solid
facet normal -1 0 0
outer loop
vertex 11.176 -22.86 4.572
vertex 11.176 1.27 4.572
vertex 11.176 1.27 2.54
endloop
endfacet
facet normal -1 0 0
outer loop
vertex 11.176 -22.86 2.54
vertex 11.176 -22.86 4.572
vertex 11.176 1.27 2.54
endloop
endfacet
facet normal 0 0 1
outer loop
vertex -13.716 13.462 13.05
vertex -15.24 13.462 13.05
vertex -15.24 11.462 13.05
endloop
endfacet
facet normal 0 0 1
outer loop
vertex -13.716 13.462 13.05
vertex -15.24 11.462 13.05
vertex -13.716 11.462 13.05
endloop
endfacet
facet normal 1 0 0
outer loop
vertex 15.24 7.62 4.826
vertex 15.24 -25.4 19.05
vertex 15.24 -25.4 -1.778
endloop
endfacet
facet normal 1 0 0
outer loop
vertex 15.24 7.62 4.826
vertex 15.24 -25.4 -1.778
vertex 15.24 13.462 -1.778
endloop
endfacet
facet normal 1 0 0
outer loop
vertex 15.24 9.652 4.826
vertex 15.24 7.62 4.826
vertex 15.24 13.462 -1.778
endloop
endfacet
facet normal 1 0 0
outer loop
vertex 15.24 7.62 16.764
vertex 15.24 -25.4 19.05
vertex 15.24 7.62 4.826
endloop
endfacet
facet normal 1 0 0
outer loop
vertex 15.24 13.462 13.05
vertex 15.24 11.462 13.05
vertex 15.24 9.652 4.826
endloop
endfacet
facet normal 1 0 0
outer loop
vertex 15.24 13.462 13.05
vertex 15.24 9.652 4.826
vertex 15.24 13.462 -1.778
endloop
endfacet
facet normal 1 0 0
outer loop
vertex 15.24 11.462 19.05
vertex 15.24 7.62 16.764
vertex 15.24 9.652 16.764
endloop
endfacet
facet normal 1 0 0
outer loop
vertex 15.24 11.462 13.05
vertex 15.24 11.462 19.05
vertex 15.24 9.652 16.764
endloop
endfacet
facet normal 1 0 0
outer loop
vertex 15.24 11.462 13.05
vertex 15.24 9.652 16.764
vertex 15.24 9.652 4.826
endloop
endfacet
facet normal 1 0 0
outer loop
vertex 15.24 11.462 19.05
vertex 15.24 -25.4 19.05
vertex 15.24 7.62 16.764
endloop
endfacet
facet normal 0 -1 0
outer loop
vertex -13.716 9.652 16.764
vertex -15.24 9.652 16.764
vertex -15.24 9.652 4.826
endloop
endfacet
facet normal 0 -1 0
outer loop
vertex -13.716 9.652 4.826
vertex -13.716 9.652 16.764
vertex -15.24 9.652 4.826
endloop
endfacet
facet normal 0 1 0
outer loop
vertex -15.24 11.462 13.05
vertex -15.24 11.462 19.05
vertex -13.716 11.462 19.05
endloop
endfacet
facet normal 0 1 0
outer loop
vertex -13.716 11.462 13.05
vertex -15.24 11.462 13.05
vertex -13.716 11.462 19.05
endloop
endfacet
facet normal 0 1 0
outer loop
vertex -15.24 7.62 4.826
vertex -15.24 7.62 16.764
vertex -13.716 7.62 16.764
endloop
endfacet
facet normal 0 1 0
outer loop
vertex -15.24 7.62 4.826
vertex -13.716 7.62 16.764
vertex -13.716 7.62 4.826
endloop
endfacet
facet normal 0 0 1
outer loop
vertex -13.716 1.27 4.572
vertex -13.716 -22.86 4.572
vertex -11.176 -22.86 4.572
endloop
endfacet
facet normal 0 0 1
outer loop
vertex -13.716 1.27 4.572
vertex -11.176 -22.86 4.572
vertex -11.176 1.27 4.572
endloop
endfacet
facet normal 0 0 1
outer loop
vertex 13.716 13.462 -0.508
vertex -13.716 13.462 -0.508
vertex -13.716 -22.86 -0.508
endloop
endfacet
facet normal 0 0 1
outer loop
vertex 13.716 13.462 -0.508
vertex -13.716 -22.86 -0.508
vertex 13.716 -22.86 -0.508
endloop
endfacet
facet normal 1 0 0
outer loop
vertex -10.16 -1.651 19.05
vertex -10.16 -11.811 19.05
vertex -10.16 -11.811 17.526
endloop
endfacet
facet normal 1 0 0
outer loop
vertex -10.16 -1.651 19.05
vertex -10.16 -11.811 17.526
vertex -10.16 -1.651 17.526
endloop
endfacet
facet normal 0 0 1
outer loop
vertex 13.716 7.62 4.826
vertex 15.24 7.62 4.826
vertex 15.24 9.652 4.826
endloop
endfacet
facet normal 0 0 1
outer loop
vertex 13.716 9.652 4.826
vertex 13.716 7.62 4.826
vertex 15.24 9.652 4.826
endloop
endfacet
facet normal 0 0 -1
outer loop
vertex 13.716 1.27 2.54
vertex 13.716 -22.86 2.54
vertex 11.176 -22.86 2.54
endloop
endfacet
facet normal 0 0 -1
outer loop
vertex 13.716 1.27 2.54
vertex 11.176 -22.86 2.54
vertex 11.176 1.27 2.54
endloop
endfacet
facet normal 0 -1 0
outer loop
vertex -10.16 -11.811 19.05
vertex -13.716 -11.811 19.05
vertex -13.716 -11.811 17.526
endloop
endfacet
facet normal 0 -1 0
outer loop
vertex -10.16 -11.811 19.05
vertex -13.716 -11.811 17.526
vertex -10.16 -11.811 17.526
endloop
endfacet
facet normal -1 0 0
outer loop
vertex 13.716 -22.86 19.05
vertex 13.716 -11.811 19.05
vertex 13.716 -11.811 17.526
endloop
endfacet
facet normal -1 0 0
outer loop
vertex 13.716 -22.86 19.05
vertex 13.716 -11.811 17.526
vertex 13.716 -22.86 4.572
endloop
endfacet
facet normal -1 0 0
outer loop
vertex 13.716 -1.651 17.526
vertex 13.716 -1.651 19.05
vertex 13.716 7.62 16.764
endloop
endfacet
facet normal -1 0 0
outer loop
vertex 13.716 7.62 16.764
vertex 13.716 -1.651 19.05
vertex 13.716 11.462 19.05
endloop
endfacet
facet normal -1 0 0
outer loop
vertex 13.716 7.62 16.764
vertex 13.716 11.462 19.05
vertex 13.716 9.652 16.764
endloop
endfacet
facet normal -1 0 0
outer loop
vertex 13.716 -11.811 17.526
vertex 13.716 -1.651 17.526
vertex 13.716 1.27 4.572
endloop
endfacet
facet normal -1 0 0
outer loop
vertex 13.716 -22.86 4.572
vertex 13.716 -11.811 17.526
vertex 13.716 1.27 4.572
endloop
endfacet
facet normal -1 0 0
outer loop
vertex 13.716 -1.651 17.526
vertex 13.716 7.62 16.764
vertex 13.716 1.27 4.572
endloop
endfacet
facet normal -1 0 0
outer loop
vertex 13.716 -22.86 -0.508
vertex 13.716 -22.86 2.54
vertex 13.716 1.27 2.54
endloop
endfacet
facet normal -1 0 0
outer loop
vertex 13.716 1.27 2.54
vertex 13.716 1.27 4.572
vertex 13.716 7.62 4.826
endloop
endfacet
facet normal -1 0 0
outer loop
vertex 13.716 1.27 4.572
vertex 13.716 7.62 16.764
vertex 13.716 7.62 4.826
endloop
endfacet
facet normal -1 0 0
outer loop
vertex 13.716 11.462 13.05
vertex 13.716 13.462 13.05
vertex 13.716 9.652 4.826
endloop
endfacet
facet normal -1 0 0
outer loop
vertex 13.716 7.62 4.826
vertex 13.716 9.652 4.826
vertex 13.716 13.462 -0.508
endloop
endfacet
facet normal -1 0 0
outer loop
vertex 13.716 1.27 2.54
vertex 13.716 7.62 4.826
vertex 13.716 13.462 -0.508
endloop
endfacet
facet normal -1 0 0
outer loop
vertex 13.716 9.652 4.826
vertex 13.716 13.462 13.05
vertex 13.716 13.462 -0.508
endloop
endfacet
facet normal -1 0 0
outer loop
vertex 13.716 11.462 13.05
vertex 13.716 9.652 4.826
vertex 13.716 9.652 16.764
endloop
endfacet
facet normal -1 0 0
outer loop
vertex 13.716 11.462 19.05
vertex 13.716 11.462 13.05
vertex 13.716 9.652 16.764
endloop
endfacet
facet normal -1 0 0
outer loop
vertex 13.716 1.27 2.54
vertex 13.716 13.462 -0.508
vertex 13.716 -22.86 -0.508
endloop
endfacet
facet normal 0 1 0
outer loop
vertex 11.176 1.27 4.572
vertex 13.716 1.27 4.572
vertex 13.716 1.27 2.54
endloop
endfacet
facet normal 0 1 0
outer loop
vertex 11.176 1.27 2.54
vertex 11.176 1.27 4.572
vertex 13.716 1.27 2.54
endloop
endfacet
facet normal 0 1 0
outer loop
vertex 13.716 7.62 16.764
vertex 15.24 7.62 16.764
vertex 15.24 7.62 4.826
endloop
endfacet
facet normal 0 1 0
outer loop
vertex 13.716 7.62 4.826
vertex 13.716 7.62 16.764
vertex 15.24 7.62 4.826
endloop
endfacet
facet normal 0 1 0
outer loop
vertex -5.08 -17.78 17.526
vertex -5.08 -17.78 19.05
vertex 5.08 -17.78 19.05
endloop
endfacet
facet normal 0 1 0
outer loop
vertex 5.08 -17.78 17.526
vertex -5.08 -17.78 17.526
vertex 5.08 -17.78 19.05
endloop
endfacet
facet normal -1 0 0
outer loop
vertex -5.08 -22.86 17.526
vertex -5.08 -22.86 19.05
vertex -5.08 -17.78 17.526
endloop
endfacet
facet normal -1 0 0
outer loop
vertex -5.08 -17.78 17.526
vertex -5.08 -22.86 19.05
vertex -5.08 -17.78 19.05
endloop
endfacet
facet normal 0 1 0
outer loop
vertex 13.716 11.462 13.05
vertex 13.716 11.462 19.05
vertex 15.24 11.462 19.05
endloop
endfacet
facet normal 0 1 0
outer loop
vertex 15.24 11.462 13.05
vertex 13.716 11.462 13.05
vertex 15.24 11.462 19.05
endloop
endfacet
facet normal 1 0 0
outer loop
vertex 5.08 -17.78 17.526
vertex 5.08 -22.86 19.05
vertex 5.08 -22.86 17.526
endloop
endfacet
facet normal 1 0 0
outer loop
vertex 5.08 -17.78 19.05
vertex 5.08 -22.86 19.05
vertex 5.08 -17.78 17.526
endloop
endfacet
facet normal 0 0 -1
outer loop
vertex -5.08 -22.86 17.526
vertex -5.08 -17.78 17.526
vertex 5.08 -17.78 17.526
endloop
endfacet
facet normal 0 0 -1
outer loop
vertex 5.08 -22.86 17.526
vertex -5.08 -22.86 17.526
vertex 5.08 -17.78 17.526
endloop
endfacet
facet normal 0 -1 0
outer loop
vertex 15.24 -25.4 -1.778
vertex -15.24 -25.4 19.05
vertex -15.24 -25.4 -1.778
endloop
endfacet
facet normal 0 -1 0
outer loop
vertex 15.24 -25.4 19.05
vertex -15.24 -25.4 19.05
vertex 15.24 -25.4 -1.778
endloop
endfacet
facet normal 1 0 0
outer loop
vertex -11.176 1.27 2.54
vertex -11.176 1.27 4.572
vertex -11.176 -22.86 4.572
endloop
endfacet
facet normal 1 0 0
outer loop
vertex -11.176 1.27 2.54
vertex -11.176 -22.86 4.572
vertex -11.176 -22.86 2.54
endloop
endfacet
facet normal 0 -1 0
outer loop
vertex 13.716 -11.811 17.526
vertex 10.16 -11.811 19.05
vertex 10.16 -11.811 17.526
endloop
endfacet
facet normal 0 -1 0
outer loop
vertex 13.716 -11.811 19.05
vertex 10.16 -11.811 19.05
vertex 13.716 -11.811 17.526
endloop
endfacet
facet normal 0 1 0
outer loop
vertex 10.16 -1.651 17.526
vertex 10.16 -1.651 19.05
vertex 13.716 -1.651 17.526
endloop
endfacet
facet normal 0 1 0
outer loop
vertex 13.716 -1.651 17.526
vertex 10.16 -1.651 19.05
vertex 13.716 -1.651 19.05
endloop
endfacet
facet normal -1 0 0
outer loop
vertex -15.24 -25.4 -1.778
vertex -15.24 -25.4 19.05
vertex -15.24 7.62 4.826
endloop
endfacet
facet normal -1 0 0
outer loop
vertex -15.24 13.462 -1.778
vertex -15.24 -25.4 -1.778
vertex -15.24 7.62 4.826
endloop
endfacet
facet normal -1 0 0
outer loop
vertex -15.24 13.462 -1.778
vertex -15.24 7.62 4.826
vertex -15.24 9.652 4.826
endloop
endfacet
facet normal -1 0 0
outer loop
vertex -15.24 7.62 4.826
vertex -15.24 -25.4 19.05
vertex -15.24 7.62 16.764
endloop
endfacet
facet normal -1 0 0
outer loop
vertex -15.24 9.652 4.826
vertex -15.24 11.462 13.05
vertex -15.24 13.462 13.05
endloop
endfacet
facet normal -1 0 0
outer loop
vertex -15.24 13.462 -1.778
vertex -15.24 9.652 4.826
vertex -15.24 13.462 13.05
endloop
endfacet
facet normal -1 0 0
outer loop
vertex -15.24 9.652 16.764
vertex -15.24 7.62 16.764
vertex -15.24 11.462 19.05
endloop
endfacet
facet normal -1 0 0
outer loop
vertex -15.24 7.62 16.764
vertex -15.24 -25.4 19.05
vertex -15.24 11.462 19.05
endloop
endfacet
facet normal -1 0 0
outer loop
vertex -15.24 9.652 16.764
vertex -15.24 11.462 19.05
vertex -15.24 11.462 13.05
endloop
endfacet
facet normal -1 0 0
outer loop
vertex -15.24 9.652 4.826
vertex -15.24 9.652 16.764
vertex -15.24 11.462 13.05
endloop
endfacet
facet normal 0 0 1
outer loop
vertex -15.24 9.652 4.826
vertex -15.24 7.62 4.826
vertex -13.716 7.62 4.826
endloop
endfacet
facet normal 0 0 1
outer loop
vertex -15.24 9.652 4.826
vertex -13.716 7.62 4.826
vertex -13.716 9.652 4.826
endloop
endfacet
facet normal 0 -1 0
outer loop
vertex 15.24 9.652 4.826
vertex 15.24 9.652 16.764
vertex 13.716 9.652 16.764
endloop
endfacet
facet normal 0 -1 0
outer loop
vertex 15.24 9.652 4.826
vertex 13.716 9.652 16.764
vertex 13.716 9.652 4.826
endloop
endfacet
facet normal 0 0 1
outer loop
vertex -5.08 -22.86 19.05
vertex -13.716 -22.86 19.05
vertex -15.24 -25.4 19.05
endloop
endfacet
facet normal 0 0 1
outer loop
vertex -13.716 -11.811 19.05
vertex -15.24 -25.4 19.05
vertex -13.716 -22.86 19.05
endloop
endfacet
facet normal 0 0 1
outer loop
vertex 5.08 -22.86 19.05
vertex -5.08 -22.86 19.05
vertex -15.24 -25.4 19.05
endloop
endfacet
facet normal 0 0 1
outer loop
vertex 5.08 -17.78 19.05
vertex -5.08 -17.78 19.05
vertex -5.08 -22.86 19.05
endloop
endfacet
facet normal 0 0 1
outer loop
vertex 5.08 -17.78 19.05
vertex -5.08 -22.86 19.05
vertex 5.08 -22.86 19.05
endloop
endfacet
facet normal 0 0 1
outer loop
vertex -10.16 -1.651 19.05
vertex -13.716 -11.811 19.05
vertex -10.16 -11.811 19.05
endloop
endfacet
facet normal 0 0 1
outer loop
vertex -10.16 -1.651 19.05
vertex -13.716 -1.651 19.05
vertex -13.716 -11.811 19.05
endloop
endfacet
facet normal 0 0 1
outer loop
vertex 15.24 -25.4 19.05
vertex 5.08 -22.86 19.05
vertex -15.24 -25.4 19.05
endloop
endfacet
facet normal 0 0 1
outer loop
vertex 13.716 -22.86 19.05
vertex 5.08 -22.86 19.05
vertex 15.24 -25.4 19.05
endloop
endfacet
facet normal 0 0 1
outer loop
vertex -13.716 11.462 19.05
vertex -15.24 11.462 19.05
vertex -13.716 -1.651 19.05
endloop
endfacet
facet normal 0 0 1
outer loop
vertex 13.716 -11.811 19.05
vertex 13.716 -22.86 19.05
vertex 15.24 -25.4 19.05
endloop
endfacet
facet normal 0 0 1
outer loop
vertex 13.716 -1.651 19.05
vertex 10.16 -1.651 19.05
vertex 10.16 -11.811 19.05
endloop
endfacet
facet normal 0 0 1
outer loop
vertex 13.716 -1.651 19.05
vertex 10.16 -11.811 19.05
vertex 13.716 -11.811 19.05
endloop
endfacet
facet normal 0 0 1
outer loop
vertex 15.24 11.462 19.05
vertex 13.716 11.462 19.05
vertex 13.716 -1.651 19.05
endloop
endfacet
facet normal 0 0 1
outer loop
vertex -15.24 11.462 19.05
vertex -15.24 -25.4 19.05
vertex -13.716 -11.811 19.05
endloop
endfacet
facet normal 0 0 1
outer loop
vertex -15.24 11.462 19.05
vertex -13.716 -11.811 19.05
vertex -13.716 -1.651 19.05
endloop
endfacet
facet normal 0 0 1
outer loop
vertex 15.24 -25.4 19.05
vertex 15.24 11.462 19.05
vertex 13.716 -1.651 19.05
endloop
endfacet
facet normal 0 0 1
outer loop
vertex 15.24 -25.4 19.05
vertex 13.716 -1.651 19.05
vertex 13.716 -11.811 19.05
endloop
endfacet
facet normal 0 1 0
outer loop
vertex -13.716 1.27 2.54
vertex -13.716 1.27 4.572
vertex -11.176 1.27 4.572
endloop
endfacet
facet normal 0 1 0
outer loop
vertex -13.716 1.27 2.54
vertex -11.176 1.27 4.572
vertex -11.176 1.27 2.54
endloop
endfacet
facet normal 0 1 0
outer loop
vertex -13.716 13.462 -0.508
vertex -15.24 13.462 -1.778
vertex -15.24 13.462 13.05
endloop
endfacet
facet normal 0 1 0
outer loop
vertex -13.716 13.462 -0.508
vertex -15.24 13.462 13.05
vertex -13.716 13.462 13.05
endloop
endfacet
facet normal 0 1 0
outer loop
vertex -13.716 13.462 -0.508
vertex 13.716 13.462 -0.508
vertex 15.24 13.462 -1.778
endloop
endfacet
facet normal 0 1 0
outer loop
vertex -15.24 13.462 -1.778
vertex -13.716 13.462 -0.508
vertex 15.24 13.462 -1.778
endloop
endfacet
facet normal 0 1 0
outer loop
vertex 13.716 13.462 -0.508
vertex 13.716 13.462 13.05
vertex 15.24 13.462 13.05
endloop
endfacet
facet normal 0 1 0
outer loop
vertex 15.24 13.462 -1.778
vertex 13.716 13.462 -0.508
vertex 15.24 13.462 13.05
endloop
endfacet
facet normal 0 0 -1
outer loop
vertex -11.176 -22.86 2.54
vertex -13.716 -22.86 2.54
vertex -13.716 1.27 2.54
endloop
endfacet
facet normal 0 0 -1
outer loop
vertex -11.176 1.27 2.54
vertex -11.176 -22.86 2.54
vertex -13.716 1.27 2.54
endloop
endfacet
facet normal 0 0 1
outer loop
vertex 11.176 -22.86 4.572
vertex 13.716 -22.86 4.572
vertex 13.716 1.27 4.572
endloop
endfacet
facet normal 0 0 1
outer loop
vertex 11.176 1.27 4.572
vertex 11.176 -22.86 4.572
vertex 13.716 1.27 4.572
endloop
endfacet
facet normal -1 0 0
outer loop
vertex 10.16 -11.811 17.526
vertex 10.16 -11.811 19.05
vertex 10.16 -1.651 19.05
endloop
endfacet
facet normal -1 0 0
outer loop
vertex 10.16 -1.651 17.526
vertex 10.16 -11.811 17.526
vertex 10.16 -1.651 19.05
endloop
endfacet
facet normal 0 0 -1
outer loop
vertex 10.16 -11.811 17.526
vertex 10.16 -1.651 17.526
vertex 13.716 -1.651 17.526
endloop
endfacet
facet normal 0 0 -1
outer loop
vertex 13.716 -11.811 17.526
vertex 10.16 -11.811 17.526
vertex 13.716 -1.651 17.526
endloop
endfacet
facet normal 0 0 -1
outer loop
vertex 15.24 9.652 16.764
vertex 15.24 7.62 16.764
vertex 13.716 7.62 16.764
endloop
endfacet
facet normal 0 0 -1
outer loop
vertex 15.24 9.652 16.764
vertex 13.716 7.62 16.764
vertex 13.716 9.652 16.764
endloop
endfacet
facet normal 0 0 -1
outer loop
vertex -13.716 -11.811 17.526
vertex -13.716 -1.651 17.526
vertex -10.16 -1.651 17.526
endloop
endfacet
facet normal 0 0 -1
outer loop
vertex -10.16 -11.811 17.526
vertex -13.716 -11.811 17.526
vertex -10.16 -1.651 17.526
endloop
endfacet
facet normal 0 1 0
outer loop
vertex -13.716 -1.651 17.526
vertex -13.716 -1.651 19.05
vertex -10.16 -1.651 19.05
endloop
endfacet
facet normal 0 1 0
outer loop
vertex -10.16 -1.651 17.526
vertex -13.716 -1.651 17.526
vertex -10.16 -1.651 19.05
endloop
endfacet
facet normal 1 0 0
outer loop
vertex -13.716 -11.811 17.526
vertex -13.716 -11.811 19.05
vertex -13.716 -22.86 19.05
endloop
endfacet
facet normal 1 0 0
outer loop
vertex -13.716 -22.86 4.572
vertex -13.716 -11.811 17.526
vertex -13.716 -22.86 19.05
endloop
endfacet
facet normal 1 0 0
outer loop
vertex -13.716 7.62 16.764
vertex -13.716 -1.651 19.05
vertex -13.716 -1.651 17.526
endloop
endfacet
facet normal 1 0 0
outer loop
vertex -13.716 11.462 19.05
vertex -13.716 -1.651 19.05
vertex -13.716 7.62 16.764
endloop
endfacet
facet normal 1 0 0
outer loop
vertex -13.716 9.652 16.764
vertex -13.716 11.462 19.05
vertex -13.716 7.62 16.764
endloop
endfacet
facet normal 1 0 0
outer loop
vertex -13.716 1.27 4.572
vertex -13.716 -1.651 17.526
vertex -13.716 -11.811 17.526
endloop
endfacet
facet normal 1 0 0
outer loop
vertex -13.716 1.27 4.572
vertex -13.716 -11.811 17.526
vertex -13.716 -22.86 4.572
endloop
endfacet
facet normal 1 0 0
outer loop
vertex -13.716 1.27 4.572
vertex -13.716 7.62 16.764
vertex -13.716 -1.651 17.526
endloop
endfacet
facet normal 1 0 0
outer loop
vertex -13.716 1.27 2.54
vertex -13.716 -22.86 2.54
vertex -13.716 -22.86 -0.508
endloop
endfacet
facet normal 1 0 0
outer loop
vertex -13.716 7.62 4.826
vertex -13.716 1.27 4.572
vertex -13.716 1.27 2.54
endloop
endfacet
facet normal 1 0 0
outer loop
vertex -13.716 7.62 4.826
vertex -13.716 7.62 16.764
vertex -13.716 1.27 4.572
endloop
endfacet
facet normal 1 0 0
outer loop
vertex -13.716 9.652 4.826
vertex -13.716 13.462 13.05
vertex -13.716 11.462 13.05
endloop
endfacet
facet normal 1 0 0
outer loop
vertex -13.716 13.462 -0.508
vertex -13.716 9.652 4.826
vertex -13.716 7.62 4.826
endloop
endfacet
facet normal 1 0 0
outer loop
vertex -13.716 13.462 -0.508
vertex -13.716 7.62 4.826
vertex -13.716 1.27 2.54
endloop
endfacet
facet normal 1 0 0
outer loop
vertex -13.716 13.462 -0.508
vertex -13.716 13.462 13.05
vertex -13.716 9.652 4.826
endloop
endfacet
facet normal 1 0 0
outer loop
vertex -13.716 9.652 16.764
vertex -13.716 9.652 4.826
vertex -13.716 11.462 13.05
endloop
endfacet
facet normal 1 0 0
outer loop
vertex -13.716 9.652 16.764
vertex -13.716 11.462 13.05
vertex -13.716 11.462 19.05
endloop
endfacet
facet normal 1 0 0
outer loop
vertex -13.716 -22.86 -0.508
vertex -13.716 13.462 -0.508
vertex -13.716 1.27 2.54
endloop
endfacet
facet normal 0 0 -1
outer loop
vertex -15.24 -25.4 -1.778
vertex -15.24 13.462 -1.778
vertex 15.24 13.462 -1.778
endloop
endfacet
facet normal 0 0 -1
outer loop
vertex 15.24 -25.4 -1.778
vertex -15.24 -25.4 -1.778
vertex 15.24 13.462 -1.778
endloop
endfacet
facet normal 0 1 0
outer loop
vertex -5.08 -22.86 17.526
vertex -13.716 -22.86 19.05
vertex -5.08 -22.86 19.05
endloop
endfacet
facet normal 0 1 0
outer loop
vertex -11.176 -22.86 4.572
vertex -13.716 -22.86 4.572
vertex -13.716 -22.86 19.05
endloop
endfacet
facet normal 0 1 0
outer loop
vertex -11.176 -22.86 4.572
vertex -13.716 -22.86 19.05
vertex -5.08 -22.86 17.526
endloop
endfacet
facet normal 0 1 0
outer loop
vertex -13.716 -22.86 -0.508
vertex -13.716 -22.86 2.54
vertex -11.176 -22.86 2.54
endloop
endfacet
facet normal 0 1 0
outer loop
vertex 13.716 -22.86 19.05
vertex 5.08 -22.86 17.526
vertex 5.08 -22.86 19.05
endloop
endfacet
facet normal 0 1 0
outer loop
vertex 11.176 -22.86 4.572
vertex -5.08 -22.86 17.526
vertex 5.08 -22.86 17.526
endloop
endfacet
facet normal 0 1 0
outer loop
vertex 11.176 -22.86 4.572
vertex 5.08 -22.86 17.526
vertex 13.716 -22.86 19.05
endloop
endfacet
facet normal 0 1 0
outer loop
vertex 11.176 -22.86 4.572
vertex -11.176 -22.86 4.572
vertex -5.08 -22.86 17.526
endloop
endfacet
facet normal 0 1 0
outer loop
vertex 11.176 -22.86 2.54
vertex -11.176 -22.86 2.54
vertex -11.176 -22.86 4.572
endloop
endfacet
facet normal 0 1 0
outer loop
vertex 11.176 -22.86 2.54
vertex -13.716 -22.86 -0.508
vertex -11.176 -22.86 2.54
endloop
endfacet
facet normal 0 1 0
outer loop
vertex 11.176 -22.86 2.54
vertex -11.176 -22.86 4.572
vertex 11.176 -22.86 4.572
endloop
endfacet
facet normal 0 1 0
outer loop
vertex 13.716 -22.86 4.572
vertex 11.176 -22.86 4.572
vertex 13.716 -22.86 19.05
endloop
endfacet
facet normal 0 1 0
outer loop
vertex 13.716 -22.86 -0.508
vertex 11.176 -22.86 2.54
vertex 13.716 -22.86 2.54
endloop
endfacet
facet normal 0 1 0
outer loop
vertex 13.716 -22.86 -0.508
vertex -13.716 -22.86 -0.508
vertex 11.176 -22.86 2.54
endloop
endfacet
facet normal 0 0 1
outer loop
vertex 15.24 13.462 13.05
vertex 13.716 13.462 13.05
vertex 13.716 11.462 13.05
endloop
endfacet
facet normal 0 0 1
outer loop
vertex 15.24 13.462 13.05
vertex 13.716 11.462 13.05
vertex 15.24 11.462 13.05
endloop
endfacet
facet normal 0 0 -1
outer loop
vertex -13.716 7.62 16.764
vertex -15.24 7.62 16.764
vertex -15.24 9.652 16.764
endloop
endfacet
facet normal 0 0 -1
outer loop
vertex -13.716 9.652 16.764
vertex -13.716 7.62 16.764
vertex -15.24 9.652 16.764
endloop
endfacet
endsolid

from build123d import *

# Parameters (mm, degrees)
SKETCH1_W                = 30.48
SKETCH1_H                = 40.64
INITIAL_BLOCK_DEPTH      = 19.05
INITIAL_BLOCK_DEPTH_BACK = 1.778
SKETCH2_W                = 27.432
SKETCH2_H                = 19.558
INITIAL_CUT_DEPTH        = 38.1
SKETCH20_W               = 5.08
SKETCH20_H               = 10.16
SKETCH20_W_2             = 10.16
SKETCH20_H_2             = 5.08
BOSS_EXTRUDE1_DEPTH      = 1.524
SKETCH21_W               = 2.032
SKETCH21_H               = 24.13
BOSS_EXTRUDE2_DEPTH      = 2.54
SKETCH27_W               = 11.938
SKETCH27_H               = 2.032
CUT_EXTRUDE6_DEPTH       = 1.524
SKETCH28_W               = 30.48
SKETCH28_H               = 1.778
CUT_EXTRUDE7_DEPTH       = 21.828
SKETCH29_W               = 30.48
SKETCH29_H               = 2
CUT_EXTRUDE8_DEPTH       = 6


with BuildPart() as part:
    # Sketch1 → Initial Block (new body, two sides)
    with BuildSketch(Plane.XY) as initial_block_sk:
        with Locations((0, -5.08)):
            Rectangle(SKETCH1_W, SKETCH1_H)
    extrude(amount=INITIAL_BLOCK_DEPTH)
    extrude(initial_block_sk.sketch, amount=-INITIAL_BLOCK_DEPTH_BACK)

    # Sketch2 → Initial Cut (cut)
    with BuildSketch(Plane(origin=(0, 15.24, 0), x_dir=(1, 0, 0), z_dir=(0, 1, 0))):
        with Locations((0, -9.271)):
            Rectangle(SKETCH2_W, SKETCH2_H)
    extrude(amount=-INITIAL_CUT_DEPTH, mode=Mode.SUBTRACT)

    # Sketch20 → Boss-Extrude1 (add)
    with BuildSketch(Plane.XY.offset(19.05)):
        with Locations((-12.7, -6.731)):
            Rectangle(SKETCH20_W, SKETCH20_H)
        with Locations((12.7, -6.731)):
            Rectangle(SKETCH20_W, SKETCH20_H)
        with Locations((0, -20.32)):
            Rectangle(SKETCH20_W_2, SKETCH20_H_2)
    extrude(amount=-BOSS_EXTRUDE1_DEPTH)

    # Sketch21 → Boss-Extrude2 (add)
    with BuildSketch(Plane(origin=(-13.716, 0, 0), x_dir=(0, 0, -1), z_dir=(1, 0, 0))):
        with Locations((-3.556, -10.795)):
            Rectangle(SKETCH21_W, SKETCH21_H)
    boss_extrude2 = extrude(amount=BOSS_EXTRUDE2_DEPTH)

    # Mirror2: Boss-Extrude2 across plane
    add(boss_extrude2.mirror(Plane(origin=(0, 0, 0), x_dir=(0, 0, 1), z_dir=(1, 0, 0))))

    # Sketch27 → Cut-Extrude6 (cut)
    with BuildSketch(Plane(origin=(15.24, 0, 0), x_dir=(0, 0, -1), z_dir=(1, 0, 0))):
        with Locations((-10.795, 8.636)):
            Rectangle(SKETCH27_W, SKETCH27_H)
    cut_extrude6 = extrude(amount=-CUT_EXTRUDE6_DEPTH, mode=Mode.SUBTRACT)

    # Mirror6: Cut-Extrude6 across plane
    add(cut_extrude6.mirror(Plane(origin=(0, 0, 0), x_dir=(0, 0, 1), z_dir=(1, 0, 0))), mode=Mode.SUBTRACT)

    # Sketch28 → Cut-Extrude7 (cut, through all)
    with BuildSketch(Plane.XY.offset(19.05)):
        with Locations((0, 14.351)):
            Rectangle(SKETCH28_W, SKETCH28_H)
    extrude(amount=-CUT_EXTRUDE7_DEPTH, mode=Mode.SUBTRACT)

    # Sketch29 → Cut-Extrude8 (cut)
    with BuildSketch(Plane.XY.offset(19.05)):
        with Locations((0, 12.462)):
            Rectangle(SKETCH29_W, SKETCH29_H)
    extrude(amount=-CUT_EXTRUDE8_DEPTH, mode=Mode.SUBTRACT)


solid = part.part
